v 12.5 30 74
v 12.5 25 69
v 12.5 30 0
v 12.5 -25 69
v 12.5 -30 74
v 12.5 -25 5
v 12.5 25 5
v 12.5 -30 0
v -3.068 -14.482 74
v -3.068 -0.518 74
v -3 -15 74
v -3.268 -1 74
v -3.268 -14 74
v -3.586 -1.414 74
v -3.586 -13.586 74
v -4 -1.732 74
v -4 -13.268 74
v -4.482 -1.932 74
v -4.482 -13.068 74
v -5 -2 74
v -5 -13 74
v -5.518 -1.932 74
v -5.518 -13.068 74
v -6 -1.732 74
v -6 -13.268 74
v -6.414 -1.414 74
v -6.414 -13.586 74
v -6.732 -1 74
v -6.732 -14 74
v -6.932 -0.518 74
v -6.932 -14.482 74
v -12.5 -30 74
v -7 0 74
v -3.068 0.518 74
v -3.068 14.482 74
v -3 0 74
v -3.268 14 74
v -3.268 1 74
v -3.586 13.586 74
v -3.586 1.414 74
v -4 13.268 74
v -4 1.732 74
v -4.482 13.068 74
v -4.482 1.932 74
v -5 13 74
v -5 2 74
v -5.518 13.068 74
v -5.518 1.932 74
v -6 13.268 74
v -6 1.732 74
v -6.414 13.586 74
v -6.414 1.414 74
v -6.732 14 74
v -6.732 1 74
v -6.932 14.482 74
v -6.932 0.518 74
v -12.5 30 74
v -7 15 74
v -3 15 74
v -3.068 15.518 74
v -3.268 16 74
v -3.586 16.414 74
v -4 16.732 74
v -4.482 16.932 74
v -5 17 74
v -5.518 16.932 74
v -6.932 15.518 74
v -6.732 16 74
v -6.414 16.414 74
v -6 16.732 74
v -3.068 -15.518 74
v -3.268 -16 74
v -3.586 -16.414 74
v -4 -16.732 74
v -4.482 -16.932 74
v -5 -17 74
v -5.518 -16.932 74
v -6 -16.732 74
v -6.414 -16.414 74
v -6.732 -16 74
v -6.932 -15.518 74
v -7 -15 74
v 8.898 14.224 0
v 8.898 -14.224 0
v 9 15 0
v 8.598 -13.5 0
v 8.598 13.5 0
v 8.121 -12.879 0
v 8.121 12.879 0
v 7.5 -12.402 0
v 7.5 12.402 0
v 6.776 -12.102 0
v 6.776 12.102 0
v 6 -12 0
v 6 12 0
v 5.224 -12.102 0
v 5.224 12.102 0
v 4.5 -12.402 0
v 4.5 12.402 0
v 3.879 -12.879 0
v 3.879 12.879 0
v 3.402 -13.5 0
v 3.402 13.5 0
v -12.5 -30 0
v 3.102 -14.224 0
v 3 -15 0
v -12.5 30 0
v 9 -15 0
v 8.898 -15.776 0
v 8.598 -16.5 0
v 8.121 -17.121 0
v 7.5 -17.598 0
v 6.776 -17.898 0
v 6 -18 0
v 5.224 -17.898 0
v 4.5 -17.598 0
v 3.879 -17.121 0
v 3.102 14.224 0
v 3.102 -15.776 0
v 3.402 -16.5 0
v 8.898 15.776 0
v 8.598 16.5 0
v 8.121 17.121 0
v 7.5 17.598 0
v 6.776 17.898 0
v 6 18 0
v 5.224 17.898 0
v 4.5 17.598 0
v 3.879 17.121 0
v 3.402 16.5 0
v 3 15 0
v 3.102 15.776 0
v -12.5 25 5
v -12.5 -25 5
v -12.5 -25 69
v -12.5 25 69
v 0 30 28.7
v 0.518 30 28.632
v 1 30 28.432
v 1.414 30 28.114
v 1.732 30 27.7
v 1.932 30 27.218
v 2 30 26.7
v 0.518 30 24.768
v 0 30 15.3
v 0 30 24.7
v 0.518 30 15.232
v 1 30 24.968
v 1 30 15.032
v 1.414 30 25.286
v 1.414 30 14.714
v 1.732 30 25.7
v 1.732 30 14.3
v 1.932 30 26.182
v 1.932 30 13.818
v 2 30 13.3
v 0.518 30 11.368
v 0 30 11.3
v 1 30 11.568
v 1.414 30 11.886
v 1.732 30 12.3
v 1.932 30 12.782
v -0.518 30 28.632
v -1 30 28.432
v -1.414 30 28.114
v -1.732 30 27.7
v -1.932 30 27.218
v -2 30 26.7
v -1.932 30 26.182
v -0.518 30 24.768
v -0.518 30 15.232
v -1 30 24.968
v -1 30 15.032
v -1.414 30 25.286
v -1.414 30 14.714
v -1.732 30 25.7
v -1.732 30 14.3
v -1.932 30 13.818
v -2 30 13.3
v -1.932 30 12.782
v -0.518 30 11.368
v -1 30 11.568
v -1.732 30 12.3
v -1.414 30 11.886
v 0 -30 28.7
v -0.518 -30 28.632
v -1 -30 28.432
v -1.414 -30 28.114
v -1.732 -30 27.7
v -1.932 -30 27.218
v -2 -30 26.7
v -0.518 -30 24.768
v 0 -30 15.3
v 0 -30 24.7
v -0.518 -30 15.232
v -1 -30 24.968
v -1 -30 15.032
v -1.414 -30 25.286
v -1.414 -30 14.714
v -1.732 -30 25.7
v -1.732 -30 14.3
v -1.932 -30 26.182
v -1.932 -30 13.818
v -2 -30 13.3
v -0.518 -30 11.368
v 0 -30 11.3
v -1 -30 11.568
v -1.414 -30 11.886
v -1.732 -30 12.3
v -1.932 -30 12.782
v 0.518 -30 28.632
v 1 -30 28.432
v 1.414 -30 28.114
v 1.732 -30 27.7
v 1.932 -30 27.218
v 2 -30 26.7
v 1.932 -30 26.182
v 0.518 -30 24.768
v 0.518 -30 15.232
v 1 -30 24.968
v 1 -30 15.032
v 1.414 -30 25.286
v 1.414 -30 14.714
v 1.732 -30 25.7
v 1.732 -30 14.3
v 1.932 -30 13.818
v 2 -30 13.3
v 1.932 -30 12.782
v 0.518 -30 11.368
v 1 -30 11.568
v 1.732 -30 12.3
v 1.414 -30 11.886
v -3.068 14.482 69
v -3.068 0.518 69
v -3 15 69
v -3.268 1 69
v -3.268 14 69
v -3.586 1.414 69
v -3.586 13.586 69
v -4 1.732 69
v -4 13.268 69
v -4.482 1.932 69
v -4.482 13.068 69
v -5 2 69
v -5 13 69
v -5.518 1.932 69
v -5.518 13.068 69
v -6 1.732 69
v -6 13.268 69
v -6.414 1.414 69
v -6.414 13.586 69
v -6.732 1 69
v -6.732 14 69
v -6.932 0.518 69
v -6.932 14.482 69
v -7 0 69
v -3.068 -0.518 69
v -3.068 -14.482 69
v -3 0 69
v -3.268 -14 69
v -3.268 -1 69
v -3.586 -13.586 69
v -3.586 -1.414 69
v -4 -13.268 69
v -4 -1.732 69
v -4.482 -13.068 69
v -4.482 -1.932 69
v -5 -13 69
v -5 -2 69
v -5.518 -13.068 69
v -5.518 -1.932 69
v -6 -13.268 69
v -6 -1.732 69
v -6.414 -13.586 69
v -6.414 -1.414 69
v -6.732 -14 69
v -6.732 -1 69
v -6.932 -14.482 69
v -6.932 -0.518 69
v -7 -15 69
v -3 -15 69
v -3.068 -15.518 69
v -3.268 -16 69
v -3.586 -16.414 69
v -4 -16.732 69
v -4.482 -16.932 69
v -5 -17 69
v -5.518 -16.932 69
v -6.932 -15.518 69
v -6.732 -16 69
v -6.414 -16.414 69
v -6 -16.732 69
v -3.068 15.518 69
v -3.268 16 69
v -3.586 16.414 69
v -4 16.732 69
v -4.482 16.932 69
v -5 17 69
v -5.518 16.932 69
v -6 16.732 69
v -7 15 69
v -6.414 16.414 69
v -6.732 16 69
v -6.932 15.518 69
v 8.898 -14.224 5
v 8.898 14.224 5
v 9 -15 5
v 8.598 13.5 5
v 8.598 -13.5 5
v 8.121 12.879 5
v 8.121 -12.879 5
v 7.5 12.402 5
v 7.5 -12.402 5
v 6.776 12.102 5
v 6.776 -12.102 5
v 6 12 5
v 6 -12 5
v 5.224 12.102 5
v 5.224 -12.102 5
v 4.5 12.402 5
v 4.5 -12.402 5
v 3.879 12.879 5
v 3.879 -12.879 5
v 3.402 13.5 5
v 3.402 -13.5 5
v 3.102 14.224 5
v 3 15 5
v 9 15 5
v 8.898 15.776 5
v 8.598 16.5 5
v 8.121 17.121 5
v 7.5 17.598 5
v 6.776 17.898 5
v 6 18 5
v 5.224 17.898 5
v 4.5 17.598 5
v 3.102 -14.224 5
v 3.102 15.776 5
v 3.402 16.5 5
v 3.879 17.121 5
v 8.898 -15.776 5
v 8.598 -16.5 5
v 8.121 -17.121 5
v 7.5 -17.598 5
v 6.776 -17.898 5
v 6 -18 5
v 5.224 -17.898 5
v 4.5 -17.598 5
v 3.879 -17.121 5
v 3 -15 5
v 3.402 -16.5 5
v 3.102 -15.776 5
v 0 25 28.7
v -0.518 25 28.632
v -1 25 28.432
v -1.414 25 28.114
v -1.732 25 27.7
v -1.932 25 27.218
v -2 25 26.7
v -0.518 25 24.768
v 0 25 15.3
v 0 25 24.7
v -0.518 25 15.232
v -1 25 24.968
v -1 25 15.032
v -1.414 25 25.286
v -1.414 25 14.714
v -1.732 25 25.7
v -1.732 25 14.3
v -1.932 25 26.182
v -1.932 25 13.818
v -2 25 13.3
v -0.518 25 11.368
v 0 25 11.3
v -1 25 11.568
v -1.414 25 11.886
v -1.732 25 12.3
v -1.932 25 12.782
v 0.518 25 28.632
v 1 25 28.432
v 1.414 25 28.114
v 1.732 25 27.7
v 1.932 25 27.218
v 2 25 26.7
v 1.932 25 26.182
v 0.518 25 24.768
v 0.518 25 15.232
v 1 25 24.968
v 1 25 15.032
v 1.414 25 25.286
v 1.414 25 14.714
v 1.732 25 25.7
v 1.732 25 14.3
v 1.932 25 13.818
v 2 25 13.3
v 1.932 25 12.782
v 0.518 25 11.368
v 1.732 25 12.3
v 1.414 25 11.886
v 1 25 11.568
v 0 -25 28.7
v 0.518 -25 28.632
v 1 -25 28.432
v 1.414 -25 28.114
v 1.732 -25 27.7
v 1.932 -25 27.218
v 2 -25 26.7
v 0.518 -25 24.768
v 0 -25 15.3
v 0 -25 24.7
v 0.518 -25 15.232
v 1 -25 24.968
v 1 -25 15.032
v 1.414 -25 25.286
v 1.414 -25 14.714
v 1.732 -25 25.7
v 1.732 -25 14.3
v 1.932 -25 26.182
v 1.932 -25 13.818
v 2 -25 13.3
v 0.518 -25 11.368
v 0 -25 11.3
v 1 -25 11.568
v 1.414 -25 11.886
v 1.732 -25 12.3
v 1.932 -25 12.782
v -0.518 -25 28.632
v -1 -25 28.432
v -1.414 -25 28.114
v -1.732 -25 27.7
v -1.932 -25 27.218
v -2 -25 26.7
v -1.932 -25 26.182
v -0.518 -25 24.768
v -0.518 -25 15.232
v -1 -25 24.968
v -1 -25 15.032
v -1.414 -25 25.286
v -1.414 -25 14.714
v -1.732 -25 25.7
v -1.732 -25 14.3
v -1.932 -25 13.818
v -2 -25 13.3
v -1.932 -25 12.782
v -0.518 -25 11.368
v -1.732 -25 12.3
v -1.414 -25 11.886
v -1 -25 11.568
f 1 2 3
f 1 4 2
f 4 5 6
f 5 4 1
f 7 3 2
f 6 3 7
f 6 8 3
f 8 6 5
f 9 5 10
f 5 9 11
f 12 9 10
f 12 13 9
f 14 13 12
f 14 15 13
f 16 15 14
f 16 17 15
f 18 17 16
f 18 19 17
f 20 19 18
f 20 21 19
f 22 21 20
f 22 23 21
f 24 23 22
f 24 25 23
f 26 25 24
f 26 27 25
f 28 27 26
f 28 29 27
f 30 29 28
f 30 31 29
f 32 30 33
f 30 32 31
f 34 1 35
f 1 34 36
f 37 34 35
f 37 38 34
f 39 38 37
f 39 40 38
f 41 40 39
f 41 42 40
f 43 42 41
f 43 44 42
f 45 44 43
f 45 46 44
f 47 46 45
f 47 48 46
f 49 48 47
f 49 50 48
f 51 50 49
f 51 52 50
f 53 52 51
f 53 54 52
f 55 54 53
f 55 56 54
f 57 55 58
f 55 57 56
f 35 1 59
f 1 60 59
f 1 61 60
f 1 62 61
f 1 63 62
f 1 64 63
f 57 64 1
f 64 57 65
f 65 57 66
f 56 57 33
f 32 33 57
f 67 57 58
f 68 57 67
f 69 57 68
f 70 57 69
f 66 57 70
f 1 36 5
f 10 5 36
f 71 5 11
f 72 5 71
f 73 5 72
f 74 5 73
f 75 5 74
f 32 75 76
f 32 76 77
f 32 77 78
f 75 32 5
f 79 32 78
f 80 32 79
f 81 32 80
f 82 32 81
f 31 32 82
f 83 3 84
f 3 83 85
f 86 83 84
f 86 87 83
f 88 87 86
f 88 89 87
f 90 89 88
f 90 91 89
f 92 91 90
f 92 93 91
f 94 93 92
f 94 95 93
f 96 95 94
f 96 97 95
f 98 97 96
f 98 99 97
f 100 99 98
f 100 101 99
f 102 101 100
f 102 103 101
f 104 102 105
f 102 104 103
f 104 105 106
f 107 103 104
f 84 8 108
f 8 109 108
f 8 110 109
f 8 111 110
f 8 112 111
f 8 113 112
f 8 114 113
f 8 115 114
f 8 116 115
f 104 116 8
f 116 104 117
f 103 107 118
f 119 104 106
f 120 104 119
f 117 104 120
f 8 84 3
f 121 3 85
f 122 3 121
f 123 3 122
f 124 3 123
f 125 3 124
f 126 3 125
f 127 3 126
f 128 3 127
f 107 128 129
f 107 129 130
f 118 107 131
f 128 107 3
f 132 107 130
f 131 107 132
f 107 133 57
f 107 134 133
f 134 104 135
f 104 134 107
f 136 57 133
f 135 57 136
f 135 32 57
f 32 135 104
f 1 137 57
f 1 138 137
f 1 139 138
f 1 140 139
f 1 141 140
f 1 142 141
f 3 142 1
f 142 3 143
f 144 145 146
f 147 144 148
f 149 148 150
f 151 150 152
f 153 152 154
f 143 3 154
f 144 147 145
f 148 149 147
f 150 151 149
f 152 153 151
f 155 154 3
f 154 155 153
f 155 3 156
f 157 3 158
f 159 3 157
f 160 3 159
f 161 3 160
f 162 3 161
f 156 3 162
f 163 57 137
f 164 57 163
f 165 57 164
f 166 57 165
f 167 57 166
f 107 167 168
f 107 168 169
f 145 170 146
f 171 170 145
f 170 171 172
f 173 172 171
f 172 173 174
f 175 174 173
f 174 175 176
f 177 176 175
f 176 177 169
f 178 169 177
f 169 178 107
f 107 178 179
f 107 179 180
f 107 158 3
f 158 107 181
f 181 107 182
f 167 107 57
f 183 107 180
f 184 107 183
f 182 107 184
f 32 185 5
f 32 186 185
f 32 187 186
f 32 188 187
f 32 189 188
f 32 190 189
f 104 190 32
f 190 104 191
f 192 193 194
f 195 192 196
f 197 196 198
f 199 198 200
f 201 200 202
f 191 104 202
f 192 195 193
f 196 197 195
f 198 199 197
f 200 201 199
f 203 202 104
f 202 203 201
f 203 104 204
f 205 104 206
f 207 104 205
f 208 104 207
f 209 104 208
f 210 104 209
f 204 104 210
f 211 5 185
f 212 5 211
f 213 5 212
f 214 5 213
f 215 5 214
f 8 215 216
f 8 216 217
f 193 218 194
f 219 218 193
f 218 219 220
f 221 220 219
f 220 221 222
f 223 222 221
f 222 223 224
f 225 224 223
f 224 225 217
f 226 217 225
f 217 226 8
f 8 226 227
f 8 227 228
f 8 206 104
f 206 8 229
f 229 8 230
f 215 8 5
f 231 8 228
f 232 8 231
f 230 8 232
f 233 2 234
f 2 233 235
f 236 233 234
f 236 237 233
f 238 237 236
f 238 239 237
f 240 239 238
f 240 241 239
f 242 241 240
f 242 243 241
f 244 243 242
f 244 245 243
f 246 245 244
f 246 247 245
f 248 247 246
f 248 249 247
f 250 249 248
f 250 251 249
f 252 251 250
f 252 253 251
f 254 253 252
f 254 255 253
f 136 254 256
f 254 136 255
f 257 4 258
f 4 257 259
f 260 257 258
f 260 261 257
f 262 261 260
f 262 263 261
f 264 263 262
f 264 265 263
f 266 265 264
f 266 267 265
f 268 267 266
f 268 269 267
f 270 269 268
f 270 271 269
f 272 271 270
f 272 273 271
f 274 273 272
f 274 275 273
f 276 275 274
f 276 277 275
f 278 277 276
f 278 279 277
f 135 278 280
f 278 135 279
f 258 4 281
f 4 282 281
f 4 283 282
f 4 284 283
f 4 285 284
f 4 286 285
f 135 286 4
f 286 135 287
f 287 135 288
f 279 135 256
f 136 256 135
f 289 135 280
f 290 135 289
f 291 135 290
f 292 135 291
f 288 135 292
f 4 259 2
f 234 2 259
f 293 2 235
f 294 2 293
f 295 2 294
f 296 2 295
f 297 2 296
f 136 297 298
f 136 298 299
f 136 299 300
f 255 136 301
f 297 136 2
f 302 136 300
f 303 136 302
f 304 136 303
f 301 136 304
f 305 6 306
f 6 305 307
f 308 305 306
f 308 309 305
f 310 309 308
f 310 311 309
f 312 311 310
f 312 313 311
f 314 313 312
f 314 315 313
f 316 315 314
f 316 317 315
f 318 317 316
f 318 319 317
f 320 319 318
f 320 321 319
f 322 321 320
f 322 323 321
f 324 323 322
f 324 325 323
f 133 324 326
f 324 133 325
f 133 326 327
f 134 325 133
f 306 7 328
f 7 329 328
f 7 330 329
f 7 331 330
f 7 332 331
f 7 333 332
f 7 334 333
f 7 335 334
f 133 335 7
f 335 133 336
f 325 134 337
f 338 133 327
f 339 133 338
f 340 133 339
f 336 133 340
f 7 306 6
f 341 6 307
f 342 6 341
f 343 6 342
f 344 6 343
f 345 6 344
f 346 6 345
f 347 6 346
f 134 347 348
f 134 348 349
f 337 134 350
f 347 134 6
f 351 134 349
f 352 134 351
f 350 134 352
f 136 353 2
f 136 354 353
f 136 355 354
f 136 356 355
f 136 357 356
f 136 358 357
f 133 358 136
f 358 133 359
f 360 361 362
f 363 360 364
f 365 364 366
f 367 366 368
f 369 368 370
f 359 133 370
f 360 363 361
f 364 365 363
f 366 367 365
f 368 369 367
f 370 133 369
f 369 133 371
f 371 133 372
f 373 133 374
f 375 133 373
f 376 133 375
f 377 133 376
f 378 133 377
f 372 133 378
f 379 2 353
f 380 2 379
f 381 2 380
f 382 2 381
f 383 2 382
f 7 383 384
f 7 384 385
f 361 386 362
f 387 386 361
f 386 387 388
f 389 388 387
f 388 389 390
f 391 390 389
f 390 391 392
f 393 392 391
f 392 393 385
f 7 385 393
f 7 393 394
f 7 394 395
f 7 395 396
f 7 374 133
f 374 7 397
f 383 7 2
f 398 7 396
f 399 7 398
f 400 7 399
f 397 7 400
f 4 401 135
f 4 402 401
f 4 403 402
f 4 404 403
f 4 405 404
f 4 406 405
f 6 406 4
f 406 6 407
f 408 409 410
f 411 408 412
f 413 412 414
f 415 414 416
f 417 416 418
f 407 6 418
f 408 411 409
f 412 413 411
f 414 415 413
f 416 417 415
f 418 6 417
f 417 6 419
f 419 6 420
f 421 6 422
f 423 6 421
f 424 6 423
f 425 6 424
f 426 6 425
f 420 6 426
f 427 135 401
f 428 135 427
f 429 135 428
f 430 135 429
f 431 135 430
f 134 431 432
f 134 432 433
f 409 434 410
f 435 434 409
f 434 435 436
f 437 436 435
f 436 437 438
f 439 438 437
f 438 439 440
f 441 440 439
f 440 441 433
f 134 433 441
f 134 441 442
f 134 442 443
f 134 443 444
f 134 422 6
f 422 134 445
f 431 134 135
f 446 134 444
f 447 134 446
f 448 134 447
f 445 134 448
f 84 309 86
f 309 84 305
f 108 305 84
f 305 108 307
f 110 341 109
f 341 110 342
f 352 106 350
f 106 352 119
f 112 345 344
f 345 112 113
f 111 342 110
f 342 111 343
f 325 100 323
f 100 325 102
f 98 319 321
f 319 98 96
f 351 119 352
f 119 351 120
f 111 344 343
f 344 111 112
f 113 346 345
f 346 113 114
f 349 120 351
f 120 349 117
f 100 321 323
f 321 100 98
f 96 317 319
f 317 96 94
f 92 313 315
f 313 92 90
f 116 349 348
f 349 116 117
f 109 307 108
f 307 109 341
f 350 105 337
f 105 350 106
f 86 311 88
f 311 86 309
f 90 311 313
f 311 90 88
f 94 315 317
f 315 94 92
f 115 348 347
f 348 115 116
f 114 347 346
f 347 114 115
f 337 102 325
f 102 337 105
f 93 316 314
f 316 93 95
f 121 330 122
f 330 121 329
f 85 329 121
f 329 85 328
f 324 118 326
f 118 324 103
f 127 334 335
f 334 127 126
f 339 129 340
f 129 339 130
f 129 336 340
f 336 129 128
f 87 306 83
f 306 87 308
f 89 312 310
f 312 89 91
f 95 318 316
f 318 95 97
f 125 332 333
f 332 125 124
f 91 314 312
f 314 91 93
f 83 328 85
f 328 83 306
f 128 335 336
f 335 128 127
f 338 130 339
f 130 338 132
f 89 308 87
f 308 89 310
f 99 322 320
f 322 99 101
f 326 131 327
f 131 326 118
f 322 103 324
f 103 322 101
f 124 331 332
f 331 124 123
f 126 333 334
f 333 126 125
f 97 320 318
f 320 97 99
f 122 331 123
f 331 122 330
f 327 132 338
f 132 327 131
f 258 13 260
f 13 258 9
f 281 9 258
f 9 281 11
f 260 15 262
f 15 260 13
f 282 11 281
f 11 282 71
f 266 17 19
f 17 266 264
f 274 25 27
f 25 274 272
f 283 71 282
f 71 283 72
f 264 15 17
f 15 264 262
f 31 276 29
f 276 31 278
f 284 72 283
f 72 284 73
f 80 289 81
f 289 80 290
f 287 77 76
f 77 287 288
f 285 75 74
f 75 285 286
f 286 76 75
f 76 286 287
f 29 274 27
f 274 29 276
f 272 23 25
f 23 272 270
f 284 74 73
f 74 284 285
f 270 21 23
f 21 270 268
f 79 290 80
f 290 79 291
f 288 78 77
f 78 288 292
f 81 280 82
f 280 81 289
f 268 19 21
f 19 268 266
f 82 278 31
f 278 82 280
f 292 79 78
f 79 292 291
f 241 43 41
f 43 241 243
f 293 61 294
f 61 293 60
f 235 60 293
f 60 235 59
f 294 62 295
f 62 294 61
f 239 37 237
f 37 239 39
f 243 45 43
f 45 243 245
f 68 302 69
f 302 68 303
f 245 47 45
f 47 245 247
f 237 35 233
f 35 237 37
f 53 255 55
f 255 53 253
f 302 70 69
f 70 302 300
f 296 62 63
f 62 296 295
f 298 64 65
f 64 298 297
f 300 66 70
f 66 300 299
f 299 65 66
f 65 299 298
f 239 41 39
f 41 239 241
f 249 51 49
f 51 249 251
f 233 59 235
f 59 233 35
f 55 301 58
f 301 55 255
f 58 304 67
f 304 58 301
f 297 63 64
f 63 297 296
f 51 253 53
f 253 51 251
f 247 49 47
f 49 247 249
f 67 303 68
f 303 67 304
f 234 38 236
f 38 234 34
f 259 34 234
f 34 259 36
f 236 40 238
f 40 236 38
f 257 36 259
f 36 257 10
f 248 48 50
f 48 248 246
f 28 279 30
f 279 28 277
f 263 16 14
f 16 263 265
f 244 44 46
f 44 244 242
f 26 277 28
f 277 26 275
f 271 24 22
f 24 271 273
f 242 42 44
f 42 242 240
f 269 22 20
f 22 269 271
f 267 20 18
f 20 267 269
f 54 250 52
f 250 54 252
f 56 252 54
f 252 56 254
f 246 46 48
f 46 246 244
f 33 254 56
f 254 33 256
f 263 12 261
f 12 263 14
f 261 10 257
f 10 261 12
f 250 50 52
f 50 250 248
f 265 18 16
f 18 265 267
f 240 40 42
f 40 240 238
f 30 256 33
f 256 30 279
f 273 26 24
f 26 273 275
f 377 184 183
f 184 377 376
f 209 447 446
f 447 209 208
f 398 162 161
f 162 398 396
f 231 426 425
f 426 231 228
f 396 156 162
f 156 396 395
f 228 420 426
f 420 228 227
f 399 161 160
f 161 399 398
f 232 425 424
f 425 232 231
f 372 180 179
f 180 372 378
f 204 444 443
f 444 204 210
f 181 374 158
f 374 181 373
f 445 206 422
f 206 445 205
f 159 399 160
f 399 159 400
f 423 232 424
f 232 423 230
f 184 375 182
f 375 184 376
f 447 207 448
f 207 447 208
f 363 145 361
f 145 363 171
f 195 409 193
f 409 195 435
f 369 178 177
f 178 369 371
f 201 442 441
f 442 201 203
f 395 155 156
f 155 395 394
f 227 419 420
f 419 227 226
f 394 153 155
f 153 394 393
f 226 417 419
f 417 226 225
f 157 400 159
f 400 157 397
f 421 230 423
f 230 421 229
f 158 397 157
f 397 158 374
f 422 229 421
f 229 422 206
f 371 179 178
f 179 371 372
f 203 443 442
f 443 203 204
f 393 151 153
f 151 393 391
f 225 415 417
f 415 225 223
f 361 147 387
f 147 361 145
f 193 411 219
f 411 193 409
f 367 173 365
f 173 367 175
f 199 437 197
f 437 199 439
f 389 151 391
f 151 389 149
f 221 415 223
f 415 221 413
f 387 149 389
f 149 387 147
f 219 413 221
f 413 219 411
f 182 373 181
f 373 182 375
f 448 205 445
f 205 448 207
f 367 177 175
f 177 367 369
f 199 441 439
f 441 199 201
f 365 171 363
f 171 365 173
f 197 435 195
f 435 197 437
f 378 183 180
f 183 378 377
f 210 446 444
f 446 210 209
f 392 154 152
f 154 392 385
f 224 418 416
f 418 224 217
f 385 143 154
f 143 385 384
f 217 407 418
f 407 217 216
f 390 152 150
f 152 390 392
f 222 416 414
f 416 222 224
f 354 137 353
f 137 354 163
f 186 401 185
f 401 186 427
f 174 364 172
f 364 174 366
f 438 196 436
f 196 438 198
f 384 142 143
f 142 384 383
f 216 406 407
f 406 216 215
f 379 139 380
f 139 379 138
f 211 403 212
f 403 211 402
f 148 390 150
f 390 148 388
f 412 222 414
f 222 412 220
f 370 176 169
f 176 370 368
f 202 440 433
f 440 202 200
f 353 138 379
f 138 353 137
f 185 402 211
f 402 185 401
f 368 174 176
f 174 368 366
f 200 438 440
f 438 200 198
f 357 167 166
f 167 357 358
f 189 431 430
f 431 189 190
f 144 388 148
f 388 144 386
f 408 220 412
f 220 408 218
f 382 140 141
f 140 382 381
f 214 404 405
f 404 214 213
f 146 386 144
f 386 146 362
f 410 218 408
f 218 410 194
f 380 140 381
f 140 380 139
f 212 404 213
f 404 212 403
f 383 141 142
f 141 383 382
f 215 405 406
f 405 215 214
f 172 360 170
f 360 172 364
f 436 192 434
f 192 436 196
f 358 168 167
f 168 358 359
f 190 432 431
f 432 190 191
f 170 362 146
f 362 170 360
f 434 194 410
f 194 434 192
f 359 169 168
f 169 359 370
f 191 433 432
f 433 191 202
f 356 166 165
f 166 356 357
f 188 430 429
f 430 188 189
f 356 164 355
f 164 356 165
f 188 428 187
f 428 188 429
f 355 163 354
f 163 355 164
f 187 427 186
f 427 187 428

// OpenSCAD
difference(){
    union(){
    translate([-12.5,-30,0])
        cube([25,60,37+32+5]);
//    translate([-17.5,-8,0])
//        cube([35,16,38]);
    }
    translate([-15,-25,5])
        cube([30,50,37+32-5]);
//    translate([-14,-5.5,36.5])
//        cube([20,11,20]);
    
    translate([6,-15,-1])
        cylinder(d=6,h=10,$fn=24);
    translate([6,15,-1])
        cylinder(d=6,h=10,$fn=24);
    
    translate([-5,-15,10+42])
        cylinder(d=4,h=50,$fn=24);
    translate([-5,15,42])
        cylinder(d=4,h=50,$fn=24);    
    
    
    translate([-5,0,62])
        cylinder(d=4,h=50,$fn=24);
    
    translate([0,-50,13.3])
        rotate([-90,0,0])
            cylinder(d=4,h=100,$fn=24);
    translate([0,-50,26.7])
        rotate([-90,0,0])
            cylinder(d=4,h=100,$fn=24);
    
}
